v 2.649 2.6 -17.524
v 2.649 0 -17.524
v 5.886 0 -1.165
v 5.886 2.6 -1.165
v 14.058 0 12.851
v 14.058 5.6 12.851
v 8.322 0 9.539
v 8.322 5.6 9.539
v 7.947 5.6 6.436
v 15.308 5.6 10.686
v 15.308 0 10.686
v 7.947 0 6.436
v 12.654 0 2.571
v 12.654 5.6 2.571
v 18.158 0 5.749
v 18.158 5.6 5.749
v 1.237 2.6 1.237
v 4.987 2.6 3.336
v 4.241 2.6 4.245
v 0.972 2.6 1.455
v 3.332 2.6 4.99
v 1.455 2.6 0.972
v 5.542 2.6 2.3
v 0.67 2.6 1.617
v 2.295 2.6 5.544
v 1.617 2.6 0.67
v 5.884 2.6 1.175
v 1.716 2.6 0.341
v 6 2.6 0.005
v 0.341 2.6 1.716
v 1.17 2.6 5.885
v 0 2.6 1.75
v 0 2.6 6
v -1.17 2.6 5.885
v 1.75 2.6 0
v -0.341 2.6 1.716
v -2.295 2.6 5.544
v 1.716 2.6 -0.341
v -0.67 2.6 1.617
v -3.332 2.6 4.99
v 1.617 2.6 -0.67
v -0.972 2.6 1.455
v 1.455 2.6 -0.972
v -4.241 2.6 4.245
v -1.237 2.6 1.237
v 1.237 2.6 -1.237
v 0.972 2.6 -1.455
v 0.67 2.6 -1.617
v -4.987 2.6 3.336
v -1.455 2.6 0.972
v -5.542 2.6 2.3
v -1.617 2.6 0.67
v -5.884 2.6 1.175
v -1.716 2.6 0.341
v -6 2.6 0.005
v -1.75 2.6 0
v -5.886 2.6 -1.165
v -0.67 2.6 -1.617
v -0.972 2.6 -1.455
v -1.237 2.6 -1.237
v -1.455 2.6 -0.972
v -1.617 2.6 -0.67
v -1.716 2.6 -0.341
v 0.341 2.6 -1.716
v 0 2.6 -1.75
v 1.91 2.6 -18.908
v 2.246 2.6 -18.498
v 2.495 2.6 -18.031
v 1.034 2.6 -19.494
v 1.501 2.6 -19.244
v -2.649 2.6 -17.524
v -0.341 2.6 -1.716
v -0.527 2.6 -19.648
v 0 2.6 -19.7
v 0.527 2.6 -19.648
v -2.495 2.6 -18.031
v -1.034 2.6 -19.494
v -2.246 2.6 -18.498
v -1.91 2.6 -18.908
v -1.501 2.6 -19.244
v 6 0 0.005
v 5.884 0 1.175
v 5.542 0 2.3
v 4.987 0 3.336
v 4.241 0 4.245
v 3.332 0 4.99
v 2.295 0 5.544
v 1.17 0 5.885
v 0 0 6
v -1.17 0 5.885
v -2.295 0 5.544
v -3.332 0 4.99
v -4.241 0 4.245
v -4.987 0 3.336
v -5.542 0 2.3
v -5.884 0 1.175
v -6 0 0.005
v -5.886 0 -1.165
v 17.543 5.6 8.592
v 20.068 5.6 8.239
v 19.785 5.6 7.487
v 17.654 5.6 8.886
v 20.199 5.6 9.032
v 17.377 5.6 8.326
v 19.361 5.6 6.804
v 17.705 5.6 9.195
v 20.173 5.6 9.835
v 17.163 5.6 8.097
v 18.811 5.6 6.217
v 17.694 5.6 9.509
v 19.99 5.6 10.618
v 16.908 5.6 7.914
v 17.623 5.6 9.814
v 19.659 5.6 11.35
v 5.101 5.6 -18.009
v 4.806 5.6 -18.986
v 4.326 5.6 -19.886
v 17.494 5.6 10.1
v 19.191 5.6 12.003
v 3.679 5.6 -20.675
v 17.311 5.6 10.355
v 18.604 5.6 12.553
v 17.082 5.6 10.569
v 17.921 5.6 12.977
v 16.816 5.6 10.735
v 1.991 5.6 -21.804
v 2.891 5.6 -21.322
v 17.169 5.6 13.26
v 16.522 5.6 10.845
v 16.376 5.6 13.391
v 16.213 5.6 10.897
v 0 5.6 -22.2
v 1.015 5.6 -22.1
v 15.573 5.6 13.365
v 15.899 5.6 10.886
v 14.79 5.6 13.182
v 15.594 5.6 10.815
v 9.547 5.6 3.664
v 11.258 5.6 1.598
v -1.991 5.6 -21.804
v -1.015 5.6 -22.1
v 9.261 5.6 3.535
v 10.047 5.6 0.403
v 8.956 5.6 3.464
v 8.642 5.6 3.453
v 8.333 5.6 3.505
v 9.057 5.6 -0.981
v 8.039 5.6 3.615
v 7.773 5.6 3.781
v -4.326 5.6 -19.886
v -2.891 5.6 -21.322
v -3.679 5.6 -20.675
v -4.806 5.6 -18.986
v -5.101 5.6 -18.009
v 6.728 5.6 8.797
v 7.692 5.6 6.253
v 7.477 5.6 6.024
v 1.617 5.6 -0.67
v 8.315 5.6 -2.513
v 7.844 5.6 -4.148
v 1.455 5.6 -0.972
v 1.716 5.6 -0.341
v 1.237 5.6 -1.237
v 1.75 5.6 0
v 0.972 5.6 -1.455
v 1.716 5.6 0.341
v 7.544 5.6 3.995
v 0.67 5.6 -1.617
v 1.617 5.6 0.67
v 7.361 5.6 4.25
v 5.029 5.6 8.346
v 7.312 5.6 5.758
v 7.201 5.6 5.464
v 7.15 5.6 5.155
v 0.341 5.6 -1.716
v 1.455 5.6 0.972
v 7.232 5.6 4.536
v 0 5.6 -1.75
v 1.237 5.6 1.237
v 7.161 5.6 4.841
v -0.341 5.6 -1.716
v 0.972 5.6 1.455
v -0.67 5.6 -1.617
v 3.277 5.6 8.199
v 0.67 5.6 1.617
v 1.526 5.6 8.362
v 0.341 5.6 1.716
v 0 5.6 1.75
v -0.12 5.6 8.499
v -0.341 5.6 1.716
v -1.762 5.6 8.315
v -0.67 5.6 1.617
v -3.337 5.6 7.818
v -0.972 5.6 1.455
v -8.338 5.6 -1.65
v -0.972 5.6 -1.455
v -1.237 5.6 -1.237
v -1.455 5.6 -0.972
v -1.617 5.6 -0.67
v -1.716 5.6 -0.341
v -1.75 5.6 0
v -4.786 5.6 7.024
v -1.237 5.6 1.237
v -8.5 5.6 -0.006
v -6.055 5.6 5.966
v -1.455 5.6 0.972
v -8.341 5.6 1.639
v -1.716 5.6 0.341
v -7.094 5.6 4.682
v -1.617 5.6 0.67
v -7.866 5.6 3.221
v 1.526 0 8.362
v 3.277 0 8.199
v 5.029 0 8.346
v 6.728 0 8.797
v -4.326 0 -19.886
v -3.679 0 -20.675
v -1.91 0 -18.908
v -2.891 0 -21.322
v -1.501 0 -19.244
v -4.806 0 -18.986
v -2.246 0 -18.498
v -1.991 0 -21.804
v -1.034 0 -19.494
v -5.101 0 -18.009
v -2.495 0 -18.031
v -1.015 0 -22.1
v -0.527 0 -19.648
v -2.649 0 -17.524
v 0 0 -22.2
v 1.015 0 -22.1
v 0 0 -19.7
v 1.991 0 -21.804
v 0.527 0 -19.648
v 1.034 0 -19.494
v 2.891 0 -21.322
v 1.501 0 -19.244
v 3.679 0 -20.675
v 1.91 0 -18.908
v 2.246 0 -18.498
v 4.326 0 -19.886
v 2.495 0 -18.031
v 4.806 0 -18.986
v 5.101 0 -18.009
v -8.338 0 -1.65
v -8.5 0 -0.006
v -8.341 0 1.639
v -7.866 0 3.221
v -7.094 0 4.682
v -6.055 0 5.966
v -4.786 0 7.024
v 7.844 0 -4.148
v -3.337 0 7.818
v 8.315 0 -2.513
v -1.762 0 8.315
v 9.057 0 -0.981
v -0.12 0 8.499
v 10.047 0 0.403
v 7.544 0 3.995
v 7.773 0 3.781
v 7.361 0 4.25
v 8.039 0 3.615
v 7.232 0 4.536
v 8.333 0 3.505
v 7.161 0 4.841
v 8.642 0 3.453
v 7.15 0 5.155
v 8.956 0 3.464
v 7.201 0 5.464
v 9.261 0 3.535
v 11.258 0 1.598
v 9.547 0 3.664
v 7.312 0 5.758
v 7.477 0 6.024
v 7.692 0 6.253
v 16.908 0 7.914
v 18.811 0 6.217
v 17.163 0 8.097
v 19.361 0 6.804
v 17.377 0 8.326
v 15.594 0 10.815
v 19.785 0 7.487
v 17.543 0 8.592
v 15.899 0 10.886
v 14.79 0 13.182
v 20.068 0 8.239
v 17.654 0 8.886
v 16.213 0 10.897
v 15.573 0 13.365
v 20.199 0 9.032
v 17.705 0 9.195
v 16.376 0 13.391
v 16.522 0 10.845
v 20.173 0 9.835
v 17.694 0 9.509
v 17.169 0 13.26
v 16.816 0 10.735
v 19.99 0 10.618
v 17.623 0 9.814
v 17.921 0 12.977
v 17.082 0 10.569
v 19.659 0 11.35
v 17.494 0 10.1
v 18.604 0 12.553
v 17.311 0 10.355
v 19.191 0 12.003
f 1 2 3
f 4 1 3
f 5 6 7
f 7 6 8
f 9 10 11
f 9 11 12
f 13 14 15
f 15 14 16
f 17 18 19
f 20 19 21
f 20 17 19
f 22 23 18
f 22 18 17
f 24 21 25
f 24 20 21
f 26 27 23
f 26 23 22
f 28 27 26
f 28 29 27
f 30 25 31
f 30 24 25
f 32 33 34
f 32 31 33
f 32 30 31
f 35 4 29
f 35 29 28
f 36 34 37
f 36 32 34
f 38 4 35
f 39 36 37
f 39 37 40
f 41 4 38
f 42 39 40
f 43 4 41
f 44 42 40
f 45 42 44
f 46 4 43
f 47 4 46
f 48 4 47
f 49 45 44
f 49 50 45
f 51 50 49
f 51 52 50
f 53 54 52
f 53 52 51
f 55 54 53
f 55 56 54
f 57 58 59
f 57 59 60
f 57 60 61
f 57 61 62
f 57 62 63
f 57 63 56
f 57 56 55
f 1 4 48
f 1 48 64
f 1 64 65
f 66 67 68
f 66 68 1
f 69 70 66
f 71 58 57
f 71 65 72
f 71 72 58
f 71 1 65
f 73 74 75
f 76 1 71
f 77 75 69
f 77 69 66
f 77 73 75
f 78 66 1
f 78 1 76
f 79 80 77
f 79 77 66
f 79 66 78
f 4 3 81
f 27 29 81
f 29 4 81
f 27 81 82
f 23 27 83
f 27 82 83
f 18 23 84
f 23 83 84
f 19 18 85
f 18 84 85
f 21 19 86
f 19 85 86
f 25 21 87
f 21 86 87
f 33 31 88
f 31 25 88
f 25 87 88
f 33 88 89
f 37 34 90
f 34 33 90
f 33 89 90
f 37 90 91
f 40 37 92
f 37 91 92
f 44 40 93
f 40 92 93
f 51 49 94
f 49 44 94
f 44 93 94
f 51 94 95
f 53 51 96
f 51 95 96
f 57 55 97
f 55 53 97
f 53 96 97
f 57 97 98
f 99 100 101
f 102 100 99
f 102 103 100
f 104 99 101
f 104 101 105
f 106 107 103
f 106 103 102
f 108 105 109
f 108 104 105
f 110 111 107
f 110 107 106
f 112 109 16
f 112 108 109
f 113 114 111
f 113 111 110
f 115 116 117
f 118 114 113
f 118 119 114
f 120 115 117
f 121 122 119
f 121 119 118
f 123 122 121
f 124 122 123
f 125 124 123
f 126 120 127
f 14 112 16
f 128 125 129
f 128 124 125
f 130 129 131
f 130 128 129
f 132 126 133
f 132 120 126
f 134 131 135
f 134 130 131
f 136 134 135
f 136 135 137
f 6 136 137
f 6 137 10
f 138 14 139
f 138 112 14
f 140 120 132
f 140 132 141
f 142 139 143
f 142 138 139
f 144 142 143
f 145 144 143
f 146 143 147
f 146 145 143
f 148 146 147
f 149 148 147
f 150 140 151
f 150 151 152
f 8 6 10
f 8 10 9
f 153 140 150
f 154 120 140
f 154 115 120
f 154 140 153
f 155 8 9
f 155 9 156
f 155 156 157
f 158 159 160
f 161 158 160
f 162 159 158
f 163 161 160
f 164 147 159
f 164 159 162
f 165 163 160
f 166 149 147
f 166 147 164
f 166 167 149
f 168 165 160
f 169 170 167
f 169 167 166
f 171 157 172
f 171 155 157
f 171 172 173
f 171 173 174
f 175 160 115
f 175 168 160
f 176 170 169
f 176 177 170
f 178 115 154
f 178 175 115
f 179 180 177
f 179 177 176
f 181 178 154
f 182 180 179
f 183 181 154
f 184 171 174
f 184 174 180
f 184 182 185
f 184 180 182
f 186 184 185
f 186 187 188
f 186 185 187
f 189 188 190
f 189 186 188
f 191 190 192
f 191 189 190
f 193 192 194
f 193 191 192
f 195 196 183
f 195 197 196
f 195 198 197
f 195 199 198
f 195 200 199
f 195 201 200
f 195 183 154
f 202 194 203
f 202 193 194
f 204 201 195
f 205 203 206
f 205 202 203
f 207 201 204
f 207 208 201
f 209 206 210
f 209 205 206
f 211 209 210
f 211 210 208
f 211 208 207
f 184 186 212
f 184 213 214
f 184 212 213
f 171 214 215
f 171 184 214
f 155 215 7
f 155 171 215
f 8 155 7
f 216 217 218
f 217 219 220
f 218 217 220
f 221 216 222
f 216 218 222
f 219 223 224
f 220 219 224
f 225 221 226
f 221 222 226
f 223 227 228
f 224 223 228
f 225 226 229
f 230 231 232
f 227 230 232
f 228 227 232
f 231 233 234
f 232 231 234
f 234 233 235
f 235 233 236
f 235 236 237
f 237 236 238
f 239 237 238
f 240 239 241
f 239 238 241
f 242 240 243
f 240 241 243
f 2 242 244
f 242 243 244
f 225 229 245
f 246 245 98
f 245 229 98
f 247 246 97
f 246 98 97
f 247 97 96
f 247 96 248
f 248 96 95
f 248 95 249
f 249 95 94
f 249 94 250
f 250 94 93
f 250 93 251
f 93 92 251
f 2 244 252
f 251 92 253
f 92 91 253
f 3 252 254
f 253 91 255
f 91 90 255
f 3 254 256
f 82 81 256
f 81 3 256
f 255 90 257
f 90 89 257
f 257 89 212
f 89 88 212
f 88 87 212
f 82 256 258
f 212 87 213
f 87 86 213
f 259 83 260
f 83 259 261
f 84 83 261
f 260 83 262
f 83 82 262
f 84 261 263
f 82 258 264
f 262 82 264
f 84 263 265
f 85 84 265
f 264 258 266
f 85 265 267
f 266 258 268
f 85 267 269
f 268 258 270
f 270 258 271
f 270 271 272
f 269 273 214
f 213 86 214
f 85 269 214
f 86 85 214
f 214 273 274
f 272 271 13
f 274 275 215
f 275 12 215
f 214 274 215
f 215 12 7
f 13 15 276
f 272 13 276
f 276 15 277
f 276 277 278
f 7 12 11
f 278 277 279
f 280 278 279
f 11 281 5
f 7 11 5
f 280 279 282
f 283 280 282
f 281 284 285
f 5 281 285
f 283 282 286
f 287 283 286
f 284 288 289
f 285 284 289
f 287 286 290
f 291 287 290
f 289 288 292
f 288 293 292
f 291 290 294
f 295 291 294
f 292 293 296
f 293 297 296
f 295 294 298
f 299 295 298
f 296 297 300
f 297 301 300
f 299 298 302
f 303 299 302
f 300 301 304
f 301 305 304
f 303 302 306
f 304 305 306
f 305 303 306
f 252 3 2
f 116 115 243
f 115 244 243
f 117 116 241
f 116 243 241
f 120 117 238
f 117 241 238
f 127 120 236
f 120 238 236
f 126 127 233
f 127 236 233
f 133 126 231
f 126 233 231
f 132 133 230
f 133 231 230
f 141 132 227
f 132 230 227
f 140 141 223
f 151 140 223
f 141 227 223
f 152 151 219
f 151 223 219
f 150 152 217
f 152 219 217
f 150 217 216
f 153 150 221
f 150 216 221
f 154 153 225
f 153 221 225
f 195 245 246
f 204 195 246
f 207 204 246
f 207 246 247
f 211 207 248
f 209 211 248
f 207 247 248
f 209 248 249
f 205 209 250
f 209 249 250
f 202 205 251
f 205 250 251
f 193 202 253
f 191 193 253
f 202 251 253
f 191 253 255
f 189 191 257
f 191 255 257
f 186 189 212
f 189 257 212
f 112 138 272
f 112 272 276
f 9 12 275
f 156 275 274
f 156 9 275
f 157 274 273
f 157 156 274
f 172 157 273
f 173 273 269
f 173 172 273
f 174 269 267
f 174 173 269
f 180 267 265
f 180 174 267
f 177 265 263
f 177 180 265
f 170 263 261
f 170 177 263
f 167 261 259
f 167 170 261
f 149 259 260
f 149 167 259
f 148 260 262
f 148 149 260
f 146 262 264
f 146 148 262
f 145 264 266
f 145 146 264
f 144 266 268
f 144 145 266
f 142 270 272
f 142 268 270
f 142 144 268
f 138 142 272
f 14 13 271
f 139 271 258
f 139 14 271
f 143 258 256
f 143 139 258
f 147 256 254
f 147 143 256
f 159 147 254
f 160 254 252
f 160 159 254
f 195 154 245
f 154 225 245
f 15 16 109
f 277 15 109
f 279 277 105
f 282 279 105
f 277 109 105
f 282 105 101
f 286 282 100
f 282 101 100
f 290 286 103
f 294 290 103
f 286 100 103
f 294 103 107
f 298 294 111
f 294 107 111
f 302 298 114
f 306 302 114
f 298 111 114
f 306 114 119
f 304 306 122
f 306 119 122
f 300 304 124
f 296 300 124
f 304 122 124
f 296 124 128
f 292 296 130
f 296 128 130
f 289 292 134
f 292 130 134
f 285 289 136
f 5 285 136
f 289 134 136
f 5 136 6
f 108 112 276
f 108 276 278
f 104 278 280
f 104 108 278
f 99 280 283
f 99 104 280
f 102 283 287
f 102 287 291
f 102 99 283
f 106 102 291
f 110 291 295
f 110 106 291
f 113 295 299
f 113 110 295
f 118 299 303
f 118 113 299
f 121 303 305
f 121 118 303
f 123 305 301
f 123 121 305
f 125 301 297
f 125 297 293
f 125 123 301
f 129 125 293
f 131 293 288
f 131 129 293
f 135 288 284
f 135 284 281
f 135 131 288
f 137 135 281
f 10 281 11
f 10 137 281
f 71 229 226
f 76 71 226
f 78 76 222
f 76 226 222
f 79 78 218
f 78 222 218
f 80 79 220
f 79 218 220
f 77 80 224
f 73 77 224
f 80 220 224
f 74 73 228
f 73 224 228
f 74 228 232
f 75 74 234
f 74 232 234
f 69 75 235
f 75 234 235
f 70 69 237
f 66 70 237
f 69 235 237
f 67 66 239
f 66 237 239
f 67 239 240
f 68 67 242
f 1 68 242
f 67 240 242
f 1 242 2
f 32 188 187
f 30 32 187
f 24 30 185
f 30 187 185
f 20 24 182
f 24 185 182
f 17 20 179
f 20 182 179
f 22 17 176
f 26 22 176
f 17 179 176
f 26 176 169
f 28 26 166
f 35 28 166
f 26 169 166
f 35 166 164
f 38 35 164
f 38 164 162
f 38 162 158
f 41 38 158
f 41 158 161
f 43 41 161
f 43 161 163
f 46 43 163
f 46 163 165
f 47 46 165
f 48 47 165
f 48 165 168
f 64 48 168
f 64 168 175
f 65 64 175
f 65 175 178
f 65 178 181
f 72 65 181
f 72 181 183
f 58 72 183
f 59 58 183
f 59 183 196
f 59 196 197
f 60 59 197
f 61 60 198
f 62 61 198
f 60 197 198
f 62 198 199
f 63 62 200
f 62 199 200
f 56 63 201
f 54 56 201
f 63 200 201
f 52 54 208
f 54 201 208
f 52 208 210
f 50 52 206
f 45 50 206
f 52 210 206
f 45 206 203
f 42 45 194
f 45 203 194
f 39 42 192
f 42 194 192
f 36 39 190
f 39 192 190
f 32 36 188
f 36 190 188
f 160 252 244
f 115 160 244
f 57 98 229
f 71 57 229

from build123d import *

# Parameters (mm, degrees)
EXTRUDE_THIN1_DEPTH = 2.6
BOSS_EXTRUDE1_DEPTH = 3
EXTRUDE_THIN2_DEPTH = 5.6
SKETCH5_R           = 1.75
CUT_EXTRUDE1_DEPTH  = 31.537946797
FILLET1_R           = 10


# Read off the part's stored shape, not the designer's step: Extrude-Thin1
with BuildPart() as part:
    # Extrude-Thin1 outline → Extrude-Thin1 (new body)
    with BuildSketch(Plane(origin=(0, 0, 0), x_dir=(1, 0, 0), z_dir=(0, 1, 0))):
        with BuildLine():
            ThreePointArc((5.101086932, 18.009411765), (0, 22.2), (-5.101086932, 18.009411765))
            Line((-5.101086932, 18.009411765), (-8.338315178, 1.65))
            ThreePointArc((-8.338315178, 1.65), (0, -8.5), (8.338315178, 1.65))
            Line((8.338315178, 1.65), (5.101086932, 18.009411765))
        make_face()
        with BuildLine():
            Line((-5.885869537, 1.164705882), (-2.648641292, 17.524117647))
            ThreePointArc((-2.648641292, 17.524117647), (0, 19.7), (2.648641292, 17.524117647))
            Line((2.648641292, 17.524117647), (5.885869537, 1.164705882))
            ThreePointArc((5.885869537, 1.164705882), (0, -6), (-5.885869537, 1.164705882))
        make_face(mode=Mode.SUBTRACT)
    extrude(amount=EXTRUDE_THIN1_DEPTH)

    # Sketch2 → Boss-Extrude1 (add)
    # profile 1 of 2: a face of its own
    with BuildSketch(Plane(origin=(0, 2.6, 0), x_dir=(1, 0, 0), z_dir=(0, 1, 0))):
        with BuildLine():
            Line((8.338315178, 1.65), (5.101086932, 18.009411765))
            ThreePointArc((5.101086932, 18.009411765), (0, 22.2), (-5.101086932, 18.009411765))
            Line((-5.101086932, 18.009411765), (-8.338315178, 1.65))
            ThreePointArc((-8.338315178, 1.65), (0, -8.5), (8.338315178, 1.65))
        make_face()
        with BuildLine():
            ThreePointArc((5.885869537, 1.164705882), (0, -6), (-5.885869537, 1.164705882))
            Line((-5.885869537, 1.164705882), (-2.648641292, 17.524117647))
            ThreePointArc((-2.648641292, 17.524117647), (0, 19.7), (2.648641292, 17.524117647))
            Line((2.648641292, 17.524117647), (5.885869537, 1.164705882))
        make_face(mode=Mode.SUBTRACT)
    # profile 2 of 2: a face of its own
    with BuildSketch(Plane(origin=(0, 2.6, 0), x_dir=(1, 0, 0), z_dir=(0, 1, 0))):
        with BuildLine():
            Line((-5.885869537, 1.164705882), (-2.648641292, 17.524117647))
            ThreePointArc((-2.648641292, 17.524117647), (0, 19.7), (2.648641292, 17.524117647))
            Line((2.648641292, 17.524117647), (5.885869537, 1.164705882))
            ThreePointArc((5.885869537, 1.164705882), (0, -6), (-5.885869537, 1.164705882))
        make_face()
    extrude(amount=BOSS_EXTRUDE1_DEPTH)

    # Sketch4 → Extrude-Thin2 (add, through all)
    with BuildSketch(Plane(origin=(0, 5.6, 0), x_dir=(1, 0, 0), z_dir=(0, 1, 0))):
        with BuildLine():
            Line((10.796856578, -1.499295844), (18.15807251, -5.749295844))
            ThreePointArc((18.15807251, -5.749295844), (19.658776666, -11.35), (14.05807251, -12.850704156))
            Line((14.05807251, -12.850704156), (6.696856578, -8.600704156))
            ThreePointArc((6.696856578, -8.600704156), (5.196152423, -3), (10.796856578, -1.499295844))
        make_face()
        with BuildLine():
            Line((9.546856578, -3.664359354), (16.90807251, -7.914359354))
            ThreePointArc((16.90807251, -7.914359354), (17.493713156, -10.1), (15.30807251, -10.685640646))
            Line((15.30807251, -10.685640646), (7.946856578, -6.435640646))
            ThreePointArc((7.946856578, -6.435640646), (7.361215932, -4.25), (9.546856578, -3.664359354))
        make_face(mode=Mode.SUBTRACT)
    extrude(amount=-EXTRUDE_THIN2_DEPTH)

    # Sketch5 → Cut-Extrude1 (cut, through all)
    with BuildSketch(Plane(origin=(0, 5.6, 0), x_dir=(1, 0, 0), z_dir=(0, 1, 0))):
        with Locations(Location((0, 0, 0), (0, 0, 270))):
            Circle(SKETCH5_R)
    extrude(amount=-CUT_EXTRUDE1_DEPTH, mode=Mode.SUBTRACT)

    # Fillet1
    # the kernel refuses this fillet: 10 mm, written as the material it adds along each edge
    with BuildSketch(Plane(origin=(5.055074156, 5.6, 6.833463637), x_dir=(0.7701817690160239, 0, 0.6378244607063513), z_dir=(0, -1, 0))) as fillet1_piece_1_section:
        with BuildLine():
            CenterArc((5.914673675, 9.859092079), FILLET1_R, 220.025396245, 40.344818113)
            Line((-1.74292086, 3.427821136), (-2.508680314, 2.784694042))
            ThreePointArc((-2.508680314, 2.784694042), (-1.566456977, 1.360530409), (-0.970808966, -0.239854019))
            Line((-0.970808966, -0.239854019), (0.416050435, -0.909341539))
            ThreePointArc((0.416050435, -0.909341539), (2.224378819, -0.671981767), (4.074579357, -0.985909208))
            Line((4.074579357, -0.985909208), (4.241860659, 0))
        make_face()
    fillet1_piece_1 = extrude(amount=13.604651647, mode=Mode.PRIVATE)
    fillet1_piece_1 = split(fillet1_piece_1, bisect_by=Plane(origin=(5.032331635, 0, 8.326315452), z_dir=(0, 1, 0)), keep=Keep.TOP, mode=Mode.PRIVATE)
    add(fillet1_piece_1)
    with BuildSketch(Plane(origin=(8.445490183, 5.6, 0.961090818), x_dir=(0.9339582285833896, 0, 0.35738218654736686), z_dir=(0, -1, 0))) as fillet1_piece_2_section:
        with BuildLine():
            CenterArc((6.080721922, -9.875226453), FILLET1_R, 99.060486088, 48.806816394)
            Line((-2.38746333, -4.556407174), (-3.234281856, -4.024525246))
            ThreePointArc((-3.234281856, -4.024525246), (-1.88007285, -1.868465389), (-0.968377858, 0.249488126))
            Line((-0.968377858, 0.249488126), (0.425065104, 0.905162779))
            ThreePointArc((0.425065104, 0.905162779), (2.23094582, 0.649847195), (4.348474242, 0.987522645))
            Line((4.348474242, 0.987522645), (4.505951304, 0))
        make_face()
    fillet1_piece_2 = extrude(amount=15.860022231, mode=Mode.PRIVATE)
    fillet1_piece_2 = split(fillet1_piece_2, bisect_by=Plane(origin=(9.506243906, 0, -0.256428974), z_dir=(0, 1, 0)), keep=Keep.TOP, mode=Mode.PRIVATE)
    add(fillet1_piece_2)


solid = part.part
